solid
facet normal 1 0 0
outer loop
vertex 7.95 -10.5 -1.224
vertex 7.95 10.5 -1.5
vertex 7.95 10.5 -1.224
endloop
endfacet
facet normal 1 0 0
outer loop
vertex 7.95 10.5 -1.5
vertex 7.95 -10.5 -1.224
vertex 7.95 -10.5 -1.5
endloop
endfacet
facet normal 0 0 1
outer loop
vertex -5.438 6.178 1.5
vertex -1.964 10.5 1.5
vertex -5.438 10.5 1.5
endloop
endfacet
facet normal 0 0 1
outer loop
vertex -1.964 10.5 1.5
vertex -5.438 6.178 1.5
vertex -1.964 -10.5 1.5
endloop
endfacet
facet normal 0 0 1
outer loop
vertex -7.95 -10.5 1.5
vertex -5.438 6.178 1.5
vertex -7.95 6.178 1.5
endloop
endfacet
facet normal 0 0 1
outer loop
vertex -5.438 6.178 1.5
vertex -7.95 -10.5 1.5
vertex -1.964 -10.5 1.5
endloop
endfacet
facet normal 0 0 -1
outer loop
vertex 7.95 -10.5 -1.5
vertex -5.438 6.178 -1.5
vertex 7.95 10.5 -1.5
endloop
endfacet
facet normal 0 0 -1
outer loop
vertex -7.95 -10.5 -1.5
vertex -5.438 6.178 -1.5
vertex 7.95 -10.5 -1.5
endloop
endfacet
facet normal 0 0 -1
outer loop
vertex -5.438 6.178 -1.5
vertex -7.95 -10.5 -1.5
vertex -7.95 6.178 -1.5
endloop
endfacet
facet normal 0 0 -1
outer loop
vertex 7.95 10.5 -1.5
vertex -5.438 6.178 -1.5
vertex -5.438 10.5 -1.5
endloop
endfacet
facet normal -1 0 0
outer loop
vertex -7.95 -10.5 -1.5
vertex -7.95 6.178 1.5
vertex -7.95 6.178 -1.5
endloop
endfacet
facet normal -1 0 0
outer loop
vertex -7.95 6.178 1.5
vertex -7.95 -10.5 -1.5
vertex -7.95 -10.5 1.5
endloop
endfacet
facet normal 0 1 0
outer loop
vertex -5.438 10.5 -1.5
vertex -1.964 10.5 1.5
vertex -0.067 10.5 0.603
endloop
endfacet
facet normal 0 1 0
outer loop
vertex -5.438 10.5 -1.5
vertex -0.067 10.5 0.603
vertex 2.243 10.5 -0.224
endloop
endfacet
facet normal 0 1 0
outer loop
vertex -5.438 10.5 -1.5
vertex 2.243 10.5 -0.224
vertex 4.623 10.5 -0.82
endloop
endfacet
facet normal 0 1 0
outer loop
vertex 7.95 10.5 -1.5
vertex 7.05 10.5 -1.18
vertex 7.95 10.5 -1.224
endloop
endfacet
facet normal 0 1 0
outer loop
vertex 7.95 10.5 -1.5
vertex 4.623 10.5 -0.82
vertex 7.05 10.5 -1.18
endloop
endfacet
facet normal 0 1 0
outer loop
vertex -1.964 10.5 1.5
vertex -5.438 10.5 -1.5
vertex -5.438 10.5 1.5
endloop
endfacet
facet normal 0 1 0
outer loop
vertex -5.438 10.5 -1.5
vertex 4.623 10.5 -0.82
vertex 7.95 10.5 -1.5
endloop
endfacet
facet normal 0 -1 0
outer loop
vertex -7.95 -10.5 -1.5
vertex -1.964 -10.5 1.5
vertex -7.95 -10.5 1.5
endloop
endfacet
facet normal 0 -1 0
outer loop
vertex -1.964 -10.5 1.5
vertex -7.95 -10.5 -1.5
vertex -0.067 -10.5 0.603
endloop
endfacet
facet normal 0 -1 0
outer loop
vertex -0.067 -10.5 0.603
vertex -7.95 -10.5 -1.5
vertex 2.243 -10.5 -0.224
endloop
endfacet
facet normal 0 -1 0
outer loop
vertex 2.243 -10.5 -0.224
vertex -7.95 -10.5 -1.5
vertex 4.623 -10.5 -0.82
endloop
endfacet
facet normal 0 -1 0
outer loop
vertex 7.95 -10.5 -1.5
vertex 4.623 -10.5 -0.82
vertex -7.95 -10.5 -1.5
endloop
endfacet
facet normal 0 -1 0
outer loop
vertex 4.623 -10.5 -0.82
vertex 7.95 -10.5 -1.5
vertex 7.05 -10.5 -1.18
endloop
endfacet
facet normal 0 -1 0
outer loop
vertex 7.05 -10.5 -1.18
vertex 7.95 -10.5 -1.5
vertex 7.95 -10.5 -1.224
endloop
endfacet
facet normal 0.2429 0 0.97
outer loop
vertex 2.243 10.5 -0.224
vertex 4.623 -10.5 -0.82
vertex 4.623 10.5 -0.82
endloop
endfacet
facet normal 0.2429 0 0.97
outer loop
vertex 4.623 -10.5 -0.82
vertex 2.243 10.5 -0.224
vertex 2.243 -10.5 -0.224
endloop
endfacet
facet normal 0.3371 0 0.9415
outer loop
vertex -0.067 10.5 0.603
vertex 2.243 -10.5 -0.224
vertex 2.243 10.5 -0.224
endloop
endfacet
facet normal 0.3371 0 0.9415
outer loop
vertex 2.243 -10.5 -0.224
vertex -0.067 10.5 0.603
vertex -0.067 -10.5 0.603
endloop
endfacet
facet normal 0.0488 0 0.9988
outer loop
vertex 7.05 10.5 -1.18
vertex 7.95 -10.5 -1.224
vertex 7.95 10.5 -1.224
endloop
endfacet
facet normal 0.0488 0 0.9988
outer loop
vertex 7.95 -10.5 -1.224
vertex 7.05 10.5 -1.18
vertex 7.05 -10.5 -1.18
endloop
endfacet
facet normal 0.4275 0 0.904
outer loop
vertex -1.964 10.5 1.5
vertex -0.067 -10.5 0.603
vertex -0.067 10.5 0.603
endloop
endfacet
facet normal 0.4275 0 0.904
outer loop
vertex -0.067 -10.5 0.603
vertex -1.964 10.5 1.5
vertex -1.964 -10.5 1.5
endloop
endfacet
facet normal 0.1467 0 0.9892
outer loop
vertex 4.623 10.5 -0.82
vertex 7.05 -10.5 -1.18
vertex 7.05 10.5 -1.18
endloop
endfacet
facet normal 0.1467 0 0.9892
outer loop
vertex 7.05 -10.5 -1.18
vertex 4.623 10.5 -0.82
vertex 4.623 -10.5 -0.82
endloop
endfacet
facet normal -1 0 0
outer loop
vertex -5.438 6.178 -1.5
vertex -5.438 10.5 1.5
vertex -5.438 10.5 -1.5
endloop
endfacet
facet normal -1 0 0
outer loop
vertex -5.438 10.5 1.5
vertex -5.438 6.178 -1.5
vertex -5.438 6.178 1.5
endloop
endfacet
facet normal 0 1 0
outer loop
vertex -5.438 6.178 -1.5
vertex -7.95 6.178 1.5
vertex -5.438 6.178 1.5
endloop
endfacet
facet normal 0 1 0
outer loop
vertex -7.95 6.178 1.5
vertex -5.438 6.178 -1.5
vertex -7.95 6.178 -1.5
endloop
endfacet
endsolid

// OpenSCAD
l = 15.9;
b = 21;
d = 3.0;
ausparung_x = 2.5;
ausparung_y = 4.3;
cyl_r = 25;
cyl_t_x = 9.5;
cyl_t_y = 0;
cyl_t_z = cyl_r - d/2 + 0.2;
// pyramidebstumpf mit rechteckiger grundfläche
p_boden_b = 0.7;
p_boden_l = 0.9;
p_dach_b = 0.5;
p_dach_l = 0.7;
p_hoehe = 1.8;
p_t_x = - l/2 + p_boden_l/2 + 1 * 1.0;
p_t_y = -b/2 + p_boden_b/2  + 1 * 1.0;
p_t_z= d/2 - 0.2;
polyhedron_points = [
    [p_boden_l/2, p_boden_b/2, 0],    // 0 unten vorne rechts
    [-p_boden_l/2, p_boden_b/2, 0],   // 1 unten vorne links
    [-p_boden_l/2, -p_boden_b/2, 0],  // 2 unten hinten links
    [p_boden_l/2, -p_boden_b/2, 0],   // 3 unten hinten rechts
    [p_dach_l/2, p_dach_b/2, p_hoehe],    // 4 oben vorne rechts
    [-p_dach_l/2, p_dach_b/2, p_hoehe],   // 5 oben vorne links
    [-p_dach_l/2, -p_dach_b/2, p_hoehe],  // 6 oben hinten links
    [p_dach_l/2, -p_dach_b/2, p_hoehe]    // 7 oben hinten rechts
];
polyhedron_faces = [
    [0, 1, 2, 3], // Boden
    [4, 5, 6, 7], // Dach
    [0, 4, 7, 3], // Seite rechts
    [1, 5, 6, 2], // Seite links
    [0, 1, 5, 4], // Seite vorne
    [3, 2, 6, 7]  // Seite hinten
];

//debug = true;
debug = false;
$fn = 64;
union() {
    
    difference() {
        cube([l, b, d], center=true);
        translate([cyl_t_x, cyl_t_y, cyl_t_z])
        rotate([90, 0, 0])
        cylinder(h=b*1.01, r=cyl_r, center=true);
        translate([-l/2 + ausparung_x/2, b/2 - ausparung_y/2, 0])
        cube([ausparung_x*1.01, ausparung_y*1.01, d*1.01], center=true);
    }
    
    translate([p_t_x, p_t_y, p_t_z])
    polyhedron(points = polyhedron_points, faces = polyhedron_faces);
}

if (debug) {
    translate([cyl_t_x, cyl_t_y, cyl_t_z])
    rotate([90, 0, 0])
    cylinder(h=b*1.01, r=cyl_r, center=true);
    translate([-l/2 + ausparung_x/2, b/2 - ausparung_y/2, 0])
    cube([ausparung_x*1.01, ausparung_y*1.01, d*1.01], center=true);
}
